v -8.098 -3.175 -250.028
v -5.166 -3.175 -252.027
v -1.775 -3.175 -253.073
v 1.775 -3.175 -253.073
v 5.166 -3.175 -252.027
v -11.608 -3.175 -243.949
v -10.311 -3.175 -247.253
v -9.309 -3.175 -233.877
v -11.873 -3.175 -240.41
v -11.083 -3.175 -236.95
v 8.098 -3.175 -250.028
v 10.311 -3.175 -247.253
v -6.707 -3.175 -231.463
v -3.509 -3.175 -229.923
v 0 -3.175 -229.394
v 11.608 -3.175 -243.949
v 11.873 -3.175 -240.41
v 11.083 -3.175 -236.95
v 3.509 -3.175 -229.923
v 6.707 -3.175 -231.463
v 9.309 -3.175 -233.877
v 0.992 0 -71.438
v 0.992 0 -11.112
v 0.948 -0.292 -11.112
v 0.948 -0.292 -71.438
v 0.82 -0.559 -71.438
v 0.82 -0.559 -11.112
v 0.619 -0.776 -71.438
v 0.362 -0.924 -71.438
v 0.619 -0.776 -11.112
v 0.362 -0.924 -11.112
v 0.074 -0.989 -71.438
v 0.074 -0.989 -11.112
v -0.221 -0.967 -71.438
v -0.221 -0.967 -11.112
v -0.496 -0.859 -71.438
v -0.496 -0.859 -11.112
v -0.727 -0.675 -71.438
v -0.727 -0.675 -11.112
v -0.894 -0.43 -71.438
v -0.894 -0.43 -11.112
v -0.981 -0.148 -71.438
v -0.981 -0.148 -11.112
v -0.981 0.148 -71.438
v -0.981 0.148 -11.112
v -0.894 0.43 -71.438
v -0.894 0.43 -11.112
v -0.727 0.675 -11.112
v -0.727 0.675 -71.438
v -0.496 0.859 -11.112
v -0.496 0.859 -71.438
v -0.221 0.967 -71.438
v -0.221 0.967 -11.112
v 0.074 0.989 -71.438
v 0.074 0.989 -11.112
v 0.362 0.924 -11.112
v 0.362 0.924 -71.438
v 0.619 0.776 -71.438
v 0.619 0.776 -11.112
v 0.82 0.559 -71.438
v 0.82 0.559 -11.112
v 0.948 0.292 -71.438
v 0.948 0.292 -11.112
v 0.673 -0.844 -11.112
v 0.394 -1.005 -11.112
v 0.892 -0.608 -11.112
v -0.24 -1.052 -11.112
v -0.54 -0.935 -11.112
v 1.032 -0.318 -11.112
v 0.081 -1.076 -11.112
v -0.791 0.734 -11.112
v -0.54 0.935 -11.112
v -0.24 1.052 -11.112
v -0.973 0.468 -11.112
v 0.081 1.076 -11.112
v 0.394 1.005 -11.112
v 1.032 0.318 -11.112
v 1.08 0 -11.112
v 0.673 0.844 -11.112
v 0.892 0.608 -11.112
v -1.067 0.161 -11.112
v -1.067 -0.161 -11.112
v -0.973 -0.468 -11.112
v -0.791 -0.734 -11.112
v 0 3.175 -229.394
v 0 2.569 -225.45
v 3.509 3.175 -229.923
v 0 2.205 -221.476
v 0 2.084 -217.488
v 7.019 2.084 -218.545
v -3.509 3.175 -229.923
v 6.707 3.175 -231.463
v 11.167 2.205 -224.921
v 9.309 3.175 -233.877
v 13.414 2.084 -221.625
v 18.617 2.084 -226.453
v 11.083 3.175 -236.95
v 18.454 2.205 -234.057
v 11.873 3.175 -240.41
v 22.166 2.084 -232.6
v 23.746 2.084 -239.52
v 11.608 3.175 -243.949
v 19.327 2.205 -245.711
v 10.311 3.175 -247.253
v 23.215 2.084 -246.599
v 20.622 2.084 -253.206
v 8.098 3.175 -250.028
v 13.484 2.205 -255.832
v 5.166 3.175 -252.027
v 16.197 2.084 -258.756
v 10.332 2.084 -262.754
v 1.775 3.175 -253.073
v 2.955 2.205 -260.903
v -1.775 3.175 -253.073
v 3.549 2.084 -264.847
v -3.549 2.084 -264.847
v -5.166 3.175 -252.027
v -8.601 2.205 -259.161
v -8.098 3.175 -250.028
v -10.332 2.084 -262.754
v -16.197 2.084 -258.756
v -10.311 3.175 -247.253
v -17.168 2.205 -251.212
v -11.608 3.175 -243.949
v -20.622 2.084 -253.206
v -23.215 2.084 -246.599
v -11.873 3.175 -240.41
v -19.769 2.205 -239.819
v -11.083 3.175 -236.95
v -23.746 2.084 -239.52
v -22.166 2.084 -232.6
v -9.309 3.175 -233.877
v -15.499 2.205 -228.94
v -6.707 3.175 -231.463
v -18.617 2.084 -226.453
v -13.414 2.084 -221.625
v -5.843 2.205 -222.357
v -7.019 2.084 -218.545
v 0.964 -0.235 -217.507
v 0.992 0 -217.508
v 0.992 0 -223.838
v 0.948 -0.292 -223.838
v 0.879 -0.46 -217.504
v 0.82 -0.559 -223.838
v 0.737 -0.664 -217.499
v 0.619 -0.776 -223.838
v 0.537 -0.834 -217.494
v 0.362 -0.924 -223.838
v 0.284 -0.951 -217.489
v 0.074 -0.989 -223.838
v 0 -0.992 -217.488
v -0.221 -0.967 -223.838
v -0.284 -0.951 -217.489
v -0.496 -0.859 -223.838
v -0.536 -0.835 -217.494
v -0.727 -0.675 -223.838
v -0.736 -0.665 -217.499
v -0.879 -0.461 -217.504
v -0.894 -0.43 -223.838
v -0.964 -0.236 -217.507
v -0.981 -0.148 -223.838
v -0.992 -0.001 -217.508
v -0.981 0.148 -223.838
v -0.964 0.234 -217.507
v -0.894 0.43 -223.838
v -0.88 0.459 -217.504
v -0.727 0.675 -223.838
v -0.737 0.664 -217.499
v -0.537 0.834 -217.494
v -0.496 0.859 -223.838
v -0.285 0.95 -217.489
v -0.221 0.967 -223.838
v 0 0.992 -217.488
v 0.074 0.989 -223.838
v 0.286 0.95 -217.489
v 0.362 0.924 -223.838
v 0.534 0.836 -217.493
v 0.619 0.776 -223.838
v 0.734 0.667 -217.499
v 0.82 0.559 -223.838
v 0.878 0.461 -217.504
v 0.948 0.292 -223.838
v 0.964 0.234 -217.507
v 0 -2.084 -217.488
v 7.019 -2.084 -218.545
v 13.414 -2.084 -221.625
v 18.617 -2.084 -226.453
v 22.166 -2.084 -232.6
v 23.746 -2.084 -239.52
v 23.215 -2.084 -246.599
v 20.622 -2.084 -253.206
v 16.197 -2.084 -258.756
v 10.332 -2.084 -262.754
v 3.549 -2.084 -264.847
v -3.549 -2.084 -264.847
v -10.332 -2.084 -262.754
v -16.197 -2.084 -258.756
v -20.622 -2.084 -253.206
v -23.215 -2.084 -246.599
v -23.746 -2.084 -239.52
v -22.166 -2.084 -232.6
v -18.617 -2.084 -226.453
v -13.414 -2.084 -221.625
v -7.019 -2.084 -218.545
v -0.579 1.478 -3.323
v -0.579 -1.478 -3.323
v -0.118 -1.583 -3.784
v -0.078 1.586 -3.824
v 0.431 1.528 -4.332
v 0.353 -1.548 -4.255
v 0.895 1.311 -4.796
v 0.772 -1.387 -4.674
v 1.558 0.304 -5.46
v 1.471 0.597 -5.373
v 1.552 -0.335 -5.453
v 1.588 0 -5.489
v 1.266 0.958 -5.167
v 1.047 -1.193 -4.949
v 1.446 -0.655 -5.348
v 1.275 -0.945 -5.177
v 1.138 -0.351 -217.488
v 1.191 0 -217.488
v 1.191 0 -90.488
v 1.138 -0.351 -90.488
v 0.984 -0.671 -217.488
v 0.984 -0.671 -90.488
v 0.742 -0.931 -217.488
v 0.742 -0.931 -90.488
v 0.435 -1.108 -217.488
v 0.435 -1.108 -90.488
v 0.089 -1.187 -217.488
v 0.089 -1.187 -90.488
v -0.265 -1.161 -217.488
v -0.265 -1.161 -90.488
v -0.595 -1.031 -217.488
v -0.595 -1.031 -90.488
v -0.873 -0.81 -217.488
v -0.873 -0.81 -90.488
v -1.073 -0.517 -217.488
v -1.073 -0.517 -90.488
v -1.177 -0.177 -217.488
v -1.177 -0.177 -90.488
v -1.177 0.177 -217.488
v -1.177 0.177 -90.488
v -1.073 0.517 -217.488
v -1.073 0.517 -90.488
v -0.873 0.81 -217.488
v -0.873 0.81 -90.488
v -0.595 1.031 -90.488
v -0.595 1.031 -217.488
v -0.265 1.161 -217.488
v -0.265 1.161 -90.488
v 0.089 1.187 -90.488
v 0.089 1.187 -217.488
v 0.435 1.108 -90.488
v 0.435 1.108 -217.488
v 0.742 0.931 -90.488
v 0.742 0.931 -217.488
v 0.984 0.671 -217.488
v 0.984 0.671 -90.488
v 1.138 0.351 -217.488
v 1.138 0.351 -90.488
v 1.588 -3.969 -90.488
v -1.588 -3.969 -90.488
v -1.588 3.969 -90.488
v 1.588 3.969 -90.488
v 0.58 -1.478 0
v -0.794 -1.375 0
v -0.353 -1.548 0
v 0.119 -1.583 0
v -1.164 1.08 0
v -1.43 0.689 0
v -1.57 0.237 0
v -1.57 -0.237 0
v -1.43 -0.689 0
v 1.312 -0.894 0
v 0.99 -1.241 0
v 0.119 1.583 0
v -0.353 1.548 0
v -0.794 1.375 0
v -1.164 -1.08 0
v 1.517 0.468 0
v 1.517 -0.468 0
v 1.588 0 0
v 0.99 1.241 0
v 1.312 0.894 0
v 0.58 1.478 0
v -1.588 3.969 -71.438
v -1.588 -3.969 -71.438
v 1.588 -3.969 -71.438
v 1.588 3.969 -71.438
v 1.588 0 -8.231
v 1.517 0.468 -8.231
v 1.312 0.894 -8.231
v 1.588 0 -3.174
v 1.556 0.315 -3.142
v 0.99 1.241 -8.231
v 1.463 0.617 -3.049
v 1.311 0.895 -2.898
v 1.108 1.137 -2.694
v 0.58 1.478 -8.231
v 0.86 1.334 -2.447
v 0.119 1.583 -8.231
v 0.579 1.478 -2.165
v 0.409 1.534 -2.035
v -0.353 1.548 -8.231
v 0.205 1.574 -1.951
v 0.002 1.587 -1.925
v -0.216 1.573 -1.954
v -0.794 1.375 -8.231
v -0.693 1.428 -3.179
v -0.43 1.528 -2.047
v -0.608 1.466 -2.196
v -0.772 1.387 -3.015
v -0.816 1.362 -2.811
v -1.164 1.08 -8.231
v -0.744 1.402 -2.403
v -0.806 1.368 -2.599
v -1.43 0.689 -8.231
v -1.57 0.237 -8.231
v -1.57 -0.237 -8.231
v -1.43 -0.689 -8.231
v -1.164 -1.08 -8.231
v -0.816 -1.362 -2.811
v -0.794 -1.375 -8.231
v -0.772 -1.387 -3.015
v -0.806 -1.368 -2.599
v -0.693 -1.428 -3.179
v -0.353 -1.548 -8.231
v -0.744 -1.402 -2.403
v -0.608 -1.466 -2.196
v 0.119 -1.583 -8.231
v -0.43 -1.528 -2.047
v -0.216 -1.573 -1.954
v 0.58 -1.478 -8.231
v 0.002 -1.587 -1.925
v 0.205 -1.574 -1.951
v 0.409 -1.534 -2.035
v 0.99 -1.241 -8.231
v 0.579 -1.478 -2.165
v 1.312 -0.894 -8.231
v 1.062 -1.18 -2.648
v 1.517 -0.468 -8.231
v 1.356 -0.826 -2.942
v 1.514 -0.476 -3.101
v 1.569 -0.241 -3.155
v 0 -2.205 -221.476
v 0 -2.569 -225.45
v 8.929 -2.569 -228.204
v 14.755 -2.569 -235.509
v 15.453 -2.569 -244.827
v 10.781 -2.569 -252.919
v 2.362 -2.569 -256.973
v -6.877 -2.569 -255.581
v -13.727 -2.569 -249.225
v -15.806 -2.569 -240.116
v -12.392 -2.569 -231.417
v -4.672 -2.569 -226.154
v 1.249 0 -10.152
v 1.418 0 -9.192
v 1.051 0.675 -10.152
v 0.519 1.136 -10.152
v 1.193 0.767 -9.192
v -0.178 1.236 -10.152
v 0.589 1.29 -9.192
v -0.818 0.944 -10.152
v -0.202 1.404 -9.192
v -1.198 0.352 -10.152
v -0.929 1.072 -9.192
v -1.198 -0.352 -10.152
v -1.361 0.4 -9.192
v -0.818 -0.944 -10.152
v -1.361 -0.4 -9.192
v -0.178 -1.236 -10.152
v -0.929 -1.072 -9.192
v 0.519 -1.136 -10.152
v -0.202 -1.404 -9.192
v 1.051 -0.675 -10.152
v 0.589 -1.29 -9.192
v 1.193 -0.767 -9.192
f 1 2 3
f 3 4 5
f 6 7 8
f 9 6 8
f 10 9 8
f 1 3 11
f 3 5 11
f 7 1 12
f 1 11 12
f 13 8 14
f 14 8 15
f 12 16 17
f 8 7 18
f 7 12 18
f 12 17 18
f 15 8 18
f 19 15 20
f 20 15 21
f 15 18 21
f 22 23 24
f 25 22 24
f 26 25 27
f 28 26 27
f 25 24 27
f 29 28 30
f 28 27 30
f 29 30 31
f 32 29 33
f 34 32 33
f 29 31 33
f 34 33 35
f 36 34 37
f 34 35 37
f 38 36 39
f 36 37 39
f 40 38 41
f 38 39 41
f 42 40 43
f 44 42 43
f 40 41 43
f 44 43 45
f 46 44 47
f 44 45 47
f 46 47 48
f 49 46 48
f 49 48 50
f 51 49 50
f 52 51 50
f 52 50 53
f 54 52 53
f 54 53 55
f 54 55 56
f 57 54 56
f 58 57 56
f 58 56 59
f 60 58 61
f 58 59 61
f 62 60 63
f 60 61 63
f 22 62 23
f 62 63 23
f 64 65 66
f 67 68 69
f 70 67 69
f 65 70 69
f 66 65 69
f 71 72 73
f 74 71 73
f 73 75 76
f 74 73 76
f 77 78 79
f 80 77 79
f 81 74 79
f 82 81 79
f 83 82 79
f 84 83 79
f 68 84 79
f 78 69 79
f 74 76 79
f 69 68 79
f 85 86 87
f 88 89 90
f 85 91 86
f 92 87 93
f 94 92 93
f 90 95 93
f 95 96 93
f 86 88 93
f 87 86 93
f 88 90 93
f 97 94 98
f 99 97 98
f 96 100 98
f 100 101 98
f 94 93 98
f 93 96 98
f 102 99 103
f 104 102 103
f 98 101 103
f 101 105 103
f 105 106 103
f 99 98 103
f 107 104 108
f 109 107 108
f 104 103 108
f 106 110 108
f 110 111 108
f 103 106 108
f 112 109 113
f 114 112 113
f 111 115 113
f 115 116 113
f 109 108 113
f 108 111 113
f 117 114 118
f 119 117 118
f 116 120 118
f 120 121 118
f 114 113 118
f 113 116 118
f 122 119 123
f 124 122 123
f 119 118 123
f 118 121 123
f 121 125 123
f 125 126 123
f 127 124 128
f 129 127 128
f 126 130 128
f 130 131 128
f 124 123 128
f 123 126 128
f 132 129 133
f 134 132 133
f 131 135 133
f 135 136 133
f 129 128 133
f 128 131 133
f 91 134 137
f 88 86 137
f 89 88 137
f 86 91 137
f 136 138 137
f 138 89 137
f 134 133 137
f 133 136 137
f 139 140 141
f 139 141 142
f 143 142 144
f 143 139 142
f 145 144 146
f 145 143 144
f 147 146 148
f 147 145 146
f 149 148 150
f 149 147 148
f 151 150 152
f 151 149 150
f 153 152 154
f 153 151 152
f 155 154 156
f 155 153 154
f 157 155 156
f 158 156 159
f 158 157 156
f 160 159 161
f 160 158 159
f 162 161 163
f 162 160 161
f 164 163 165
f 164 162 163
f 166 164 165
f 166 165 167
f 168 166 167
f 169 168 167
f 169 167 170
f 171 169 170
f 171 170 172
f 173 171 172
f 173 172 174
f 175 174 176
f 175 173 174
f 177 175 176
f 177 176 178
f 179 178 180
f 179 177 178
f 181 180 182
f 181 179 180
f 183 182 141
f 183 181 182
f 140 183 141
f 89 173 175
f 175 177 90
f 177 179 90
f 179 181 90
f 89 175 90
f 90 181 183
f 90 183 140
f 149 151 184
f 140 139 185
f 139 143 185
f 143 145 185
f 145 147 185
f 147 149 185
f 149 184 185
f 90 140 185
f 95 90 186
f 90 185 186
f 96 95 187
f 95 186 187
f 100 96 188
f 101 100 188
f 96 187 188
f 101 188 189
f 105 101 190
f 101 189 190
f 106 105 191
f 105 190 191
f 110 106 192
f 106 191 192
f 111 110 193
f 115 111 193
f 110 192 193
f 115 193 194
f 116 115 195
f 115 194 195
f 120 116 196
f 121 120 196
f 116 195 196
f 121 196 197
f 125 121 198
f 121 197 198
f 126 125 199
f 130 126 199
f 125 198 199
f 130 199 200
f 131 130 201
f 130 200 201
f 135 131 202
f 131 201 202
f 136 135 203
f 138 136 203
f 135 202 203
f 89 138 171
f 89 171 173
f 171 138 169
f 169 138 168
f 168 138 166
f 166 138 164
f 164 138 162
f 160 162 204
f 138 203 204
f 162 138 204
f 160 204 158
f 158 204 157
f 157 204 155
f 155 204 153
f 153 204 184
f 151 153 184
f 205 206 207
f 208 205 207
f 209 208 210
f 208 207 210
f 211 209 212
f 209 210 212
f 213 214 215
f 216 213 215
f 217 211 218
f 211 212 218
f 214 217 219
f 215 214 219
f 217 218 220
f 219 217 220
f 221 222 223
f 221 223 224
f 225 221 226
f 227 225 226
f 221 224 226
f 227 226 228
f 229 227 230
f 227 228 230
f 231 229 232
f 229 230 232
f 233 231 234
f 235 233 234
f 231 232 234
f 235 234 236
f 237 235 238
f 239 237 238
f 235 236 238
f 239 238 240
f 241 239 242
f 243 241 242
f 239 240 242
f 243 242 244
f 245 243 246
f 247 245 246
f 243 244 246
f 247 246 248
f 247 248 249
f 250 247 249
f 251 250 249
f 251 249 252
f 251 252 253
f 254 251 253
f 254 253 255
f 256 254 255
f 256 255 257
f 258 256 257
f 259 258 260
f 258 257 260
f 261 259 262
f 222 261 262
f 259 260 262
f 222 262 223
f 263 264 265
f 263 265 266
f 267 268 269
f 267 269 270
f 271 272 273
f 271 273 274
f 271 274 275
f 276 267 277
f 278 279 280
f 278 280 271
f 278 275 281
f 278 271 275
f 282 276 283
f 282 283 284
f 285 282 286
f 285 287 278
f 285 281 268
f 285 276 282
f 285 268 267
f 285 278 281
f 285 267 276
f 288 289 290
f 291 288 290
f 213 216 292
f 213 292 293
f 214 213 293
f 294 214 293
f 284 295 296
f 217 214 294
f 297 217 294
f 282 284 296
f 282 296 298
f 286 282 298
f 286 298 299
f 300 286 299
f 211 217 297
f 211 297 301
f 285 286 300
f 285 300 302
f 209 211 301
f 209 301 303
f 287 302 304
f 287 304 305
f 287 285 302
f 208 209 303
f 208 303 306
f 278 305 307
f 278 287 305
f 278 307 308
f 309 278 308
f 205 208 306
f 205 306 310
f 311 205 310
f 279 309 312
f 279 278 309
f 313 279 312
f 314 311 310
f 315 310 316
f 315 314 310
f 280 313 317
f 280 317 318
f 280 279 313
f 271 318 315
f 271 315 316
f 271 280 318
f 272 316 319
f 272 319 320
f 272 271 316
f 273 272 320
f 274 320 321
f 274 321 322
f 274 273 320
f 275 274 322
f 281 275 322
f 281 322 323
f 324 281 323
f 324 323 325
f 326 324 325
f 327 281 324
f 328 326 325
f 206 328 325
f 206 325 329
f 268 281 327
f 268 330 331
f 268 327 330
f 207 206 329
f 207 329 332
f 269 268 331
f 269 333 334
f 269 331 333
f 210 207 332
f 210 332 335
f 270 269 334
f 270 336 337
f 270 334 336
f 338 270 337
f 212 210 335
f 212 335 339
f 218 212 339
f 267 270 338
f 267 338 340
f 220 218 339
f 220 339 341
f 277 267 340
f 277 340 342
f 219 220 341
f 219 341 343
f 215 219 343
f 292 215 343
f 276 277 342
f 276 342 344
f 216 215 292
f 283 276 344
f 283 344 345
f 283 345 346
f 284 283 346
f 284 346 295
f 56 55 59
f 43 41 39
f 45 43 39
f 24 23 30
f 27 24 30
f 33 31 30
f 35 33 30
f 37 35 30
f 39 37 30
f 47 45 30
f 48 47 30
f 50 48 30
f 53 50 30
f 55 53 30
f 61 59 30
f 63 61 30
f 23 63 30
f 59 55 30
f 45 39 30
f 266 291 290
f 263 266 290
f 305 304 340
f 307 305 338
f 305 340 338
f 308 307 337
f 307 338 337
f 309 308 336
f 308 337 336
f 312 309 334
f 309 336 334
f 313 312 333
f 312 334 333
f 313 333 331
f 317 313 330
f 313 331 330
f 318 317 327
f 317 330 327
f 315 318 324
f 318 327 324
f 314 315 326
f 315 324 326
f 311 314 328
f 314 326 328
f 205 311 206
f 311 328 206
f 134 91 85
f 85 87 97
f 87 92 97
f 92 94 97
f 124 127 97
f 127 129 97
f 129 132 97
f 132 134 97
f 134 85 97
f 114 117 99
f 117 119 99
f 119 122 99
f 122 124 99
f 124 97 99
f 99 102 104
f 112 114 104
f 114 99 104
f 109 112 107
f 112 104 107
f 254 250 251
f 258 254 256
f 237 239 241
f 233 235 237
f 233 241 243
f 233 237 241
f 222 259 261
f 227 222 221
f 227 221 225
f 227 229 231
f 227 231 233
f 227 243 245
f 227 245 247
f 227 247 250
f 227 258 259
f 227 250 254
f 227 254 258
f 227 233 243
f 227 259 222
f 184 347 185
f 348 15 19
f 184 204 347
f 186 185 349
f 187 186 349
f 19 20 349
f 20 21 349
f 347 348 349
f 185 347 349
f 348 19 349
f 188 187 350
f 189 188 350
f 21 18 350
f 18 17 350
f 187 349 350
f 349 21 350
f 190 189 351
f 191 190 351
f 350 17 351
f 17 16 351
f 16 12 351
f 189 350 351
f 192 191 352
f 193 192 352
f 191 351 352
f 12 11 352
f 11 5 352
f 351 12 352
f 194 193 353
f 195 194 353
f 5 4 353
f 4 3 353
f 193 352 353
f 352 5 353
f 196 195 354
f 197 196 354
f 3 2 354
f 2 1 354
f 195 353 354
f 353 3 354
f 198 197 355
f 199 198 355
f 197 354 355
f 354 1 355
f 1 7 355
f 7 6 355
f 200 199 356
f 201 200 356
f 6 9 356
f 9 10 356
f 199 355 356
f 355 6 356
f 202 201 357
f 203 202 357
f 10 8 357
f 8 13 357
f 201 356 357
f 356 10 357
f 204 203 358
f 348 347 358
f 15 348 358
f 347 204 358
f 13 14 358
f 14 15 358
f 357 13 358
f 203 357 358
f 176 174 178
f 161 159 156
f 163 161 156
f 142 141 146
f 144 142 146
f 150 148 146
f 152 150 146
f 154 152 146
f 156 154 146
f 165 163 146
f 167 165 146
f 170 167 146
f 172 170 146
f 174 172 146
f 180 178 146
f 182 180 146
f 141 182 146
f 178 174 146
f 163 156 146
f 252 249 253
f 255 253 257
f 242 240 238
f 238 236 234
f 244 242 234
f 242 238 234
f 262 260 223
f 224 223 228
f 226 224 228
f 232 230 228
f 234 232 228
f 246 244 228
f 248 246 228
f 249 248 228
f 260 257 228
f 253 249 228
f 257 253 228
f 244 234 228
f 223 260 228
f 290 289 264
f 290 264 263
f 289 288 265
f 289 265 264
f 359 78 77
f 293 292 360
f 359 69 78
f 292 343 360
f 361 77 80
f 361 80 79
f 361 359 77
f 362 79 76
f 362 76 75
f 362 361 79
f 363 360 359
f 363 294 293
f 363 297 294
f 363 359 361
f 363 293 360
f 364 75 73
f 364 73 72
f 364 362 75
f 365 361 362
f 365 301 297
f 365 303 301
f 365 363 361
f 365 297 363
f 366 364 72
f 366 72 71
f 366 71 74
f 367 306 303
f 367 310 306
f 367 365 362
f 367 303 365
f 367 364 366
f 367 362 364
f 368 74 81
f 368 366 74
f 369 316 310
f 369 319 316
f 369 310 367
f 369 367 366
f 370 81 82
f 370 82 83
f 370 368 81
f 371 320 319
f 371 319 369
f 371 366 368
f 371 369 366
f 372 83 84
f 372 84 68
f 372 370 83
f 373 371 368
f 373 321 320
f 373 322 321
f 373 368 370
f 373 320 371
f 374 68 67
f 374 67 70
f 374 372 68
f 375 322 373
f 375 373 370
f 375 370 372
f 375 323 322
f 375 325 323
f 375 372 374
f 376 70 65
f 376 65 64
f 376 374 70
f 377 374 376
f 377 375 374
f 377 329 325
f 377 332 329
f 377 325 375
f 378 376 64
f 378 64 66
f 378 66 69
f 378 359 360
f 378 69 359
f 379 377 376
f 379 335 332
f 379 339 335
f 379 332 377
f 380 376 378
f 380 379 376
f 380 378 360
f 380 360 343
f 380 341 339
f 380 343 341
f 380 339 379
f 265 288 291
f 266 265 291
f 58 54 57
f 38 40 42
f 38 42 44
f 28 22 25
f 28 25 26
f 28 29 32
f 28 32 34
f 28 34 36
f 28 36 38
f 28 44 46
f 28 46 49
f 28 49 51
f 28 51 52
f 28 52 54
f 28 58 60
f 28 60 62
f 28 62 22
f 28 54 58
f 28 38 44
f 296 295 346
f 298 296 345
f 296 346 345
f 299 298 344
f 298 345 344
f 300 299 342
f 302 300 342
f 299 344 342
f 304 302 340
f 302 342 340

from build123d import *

# Parameters (mm, degrees)
F0_R      = 1.5875
F1_DEPTH  = 11.1125
F2_SIZE2  = 2.8810111644
F2_SIZE   = 0.508
F3_R      = 0.9921875
F4_DEPTH  = 60.325
F5_W      = 3.175
F5_H      = 7.9375
F6_DEPTH  = 19.05
F7_R      = 1.190625
F8_DEPTH  = 127
F10_DEPTH = 3.175
F14_R     = 0.9921875
F15_DEPTH = 6.35


with BuildPart() as f1:
    # F0 (on Top) → F1 (new body)
    with BuildSketch(Plane.XY):
        Circle(F0_R)
    extrude(amount=-F1_DEPTH)

    # F2
    f2_edges = [f1.edges().sort_by_distance(p)[0] for p in [
        (-1.5875, 0, -11.1125),
    ]]
    f2_side = f1.faces().sort_by_distance((0, 0, -11.1125))[0]
    chamfer(f2_edges, length=F2_SIZE, length2=F2_SIZE2, reference=f2_side)

    # F9 (on Front) → F10 (cut, symmetric)
    with BuildSketch(Plane.XZ):
        with BuildLine():
            ThreePointArc((-0.5788363413, -3.3228830071), (0.3132639705, -3.5003327921), (0.8185982042, -2.7440466658))
            ThreePointArc((0.8185982042, -2.7440466658), (0.7562861263, -2.4307826953), (0.5788363413, -2.1652103245))
            ThreePointArc((0.5788363413, -2.1652103245), (-0.5788363413, -2.1652103245), (-0.5788363413, -3.3228830071))
        make_face()
        with BuildLine():
            ThreePointArc((0.5788363413, -2.1652103245), (0.7562861263, -2.4307826953), (0.8185982042, -2.7440466658))
            ThreePointArc((0.8185982042, -2.7440466658), (0.3132639705, -3.5003327921), (-0.5788363413, -3.3228830071))
            Line((-0.5788363413, -3.3228830071), (1.8520261244, -5.7537454728))
            Line((1.8520261244, -5.7537454728), (1.8520261244, -3.4384001076))
            Line((1.8520261244, -3.4384001076), (0.5788363413, -2.1652103245))
        make_face()
    extrude(amount=F10_DEPTH, both=True, mode=Mode.SUBTRACT)


with BuildPart() as f4:
    # F3 (on face) → F4 (new body)
    with BuildSketch(Plane(origin=(0, 0, -11.1125), x_dir=(1, 0, 0), z_dir=(0, 0, -1))):
        Circle(F3_R)
    extrude(amount=F4_DEPTH)


with BuildPart() as f6:
    # F5 (on face) → F6 (new body)
    with BuildSketch(Plane(origin=(0, 0, -71.4375), x_dir=(1, 0, 0), z_dir=(0, 0, -1))):
        Rectangle(F5_W, F5_H)
    extrude(amount=F6_DEPTH)


with BuildPart() as f8:
    # F7 (on face) → F8 (new body)
    with BuildSketch(Plane(origin=(0, 0, -90.4875), x_dir=(1, 0, 0), z_dir=(0, 0, -1))):
        Circle(F7_R)
    extrude(amount=F8_DEPTH)


with BuildPart() as f12:
    # F11 (on Right) → F12 (revolve)
    with BuildSketch(Plane.YZ):
        with BuildLine():
            Line((2.08359375, -217.4875), (-2.08359375, -217.4875))
            ThreePointArc((-2.08359375, -217.4875), (-2.3570160947, -223.4655840715), (-3.175, -229.39375))
            Line((-3.175, -229.39375), (-3.175, -241.3))
            Line((-3.175, -241.3), (3.175, -241.3))
            Line((3.175, -241.3), (3.175, -229.39375))
            ThreePointArc((3.175, -229.39375), (2.3570160947, -223.4655840715), (2.08359375, -217.4875))
        make_face()
    revolve(axis=Axis((0, 0, -241.3), (0, 1, 0)))

    # F14 (on offset) → F15 (cut)
    with BuildSketch(Plane(origin=(0, 0, -217.4875), x_dir=(1, 0, 0), z_dir=(0, 0, -1))):
        Circle(F14_R)
    extrude(amount=F15_DEPTH, mode=Mode.SUBTRACT)


solid = Compound([f1.part, f4.part, f6.part, f8.part, f12.part])
